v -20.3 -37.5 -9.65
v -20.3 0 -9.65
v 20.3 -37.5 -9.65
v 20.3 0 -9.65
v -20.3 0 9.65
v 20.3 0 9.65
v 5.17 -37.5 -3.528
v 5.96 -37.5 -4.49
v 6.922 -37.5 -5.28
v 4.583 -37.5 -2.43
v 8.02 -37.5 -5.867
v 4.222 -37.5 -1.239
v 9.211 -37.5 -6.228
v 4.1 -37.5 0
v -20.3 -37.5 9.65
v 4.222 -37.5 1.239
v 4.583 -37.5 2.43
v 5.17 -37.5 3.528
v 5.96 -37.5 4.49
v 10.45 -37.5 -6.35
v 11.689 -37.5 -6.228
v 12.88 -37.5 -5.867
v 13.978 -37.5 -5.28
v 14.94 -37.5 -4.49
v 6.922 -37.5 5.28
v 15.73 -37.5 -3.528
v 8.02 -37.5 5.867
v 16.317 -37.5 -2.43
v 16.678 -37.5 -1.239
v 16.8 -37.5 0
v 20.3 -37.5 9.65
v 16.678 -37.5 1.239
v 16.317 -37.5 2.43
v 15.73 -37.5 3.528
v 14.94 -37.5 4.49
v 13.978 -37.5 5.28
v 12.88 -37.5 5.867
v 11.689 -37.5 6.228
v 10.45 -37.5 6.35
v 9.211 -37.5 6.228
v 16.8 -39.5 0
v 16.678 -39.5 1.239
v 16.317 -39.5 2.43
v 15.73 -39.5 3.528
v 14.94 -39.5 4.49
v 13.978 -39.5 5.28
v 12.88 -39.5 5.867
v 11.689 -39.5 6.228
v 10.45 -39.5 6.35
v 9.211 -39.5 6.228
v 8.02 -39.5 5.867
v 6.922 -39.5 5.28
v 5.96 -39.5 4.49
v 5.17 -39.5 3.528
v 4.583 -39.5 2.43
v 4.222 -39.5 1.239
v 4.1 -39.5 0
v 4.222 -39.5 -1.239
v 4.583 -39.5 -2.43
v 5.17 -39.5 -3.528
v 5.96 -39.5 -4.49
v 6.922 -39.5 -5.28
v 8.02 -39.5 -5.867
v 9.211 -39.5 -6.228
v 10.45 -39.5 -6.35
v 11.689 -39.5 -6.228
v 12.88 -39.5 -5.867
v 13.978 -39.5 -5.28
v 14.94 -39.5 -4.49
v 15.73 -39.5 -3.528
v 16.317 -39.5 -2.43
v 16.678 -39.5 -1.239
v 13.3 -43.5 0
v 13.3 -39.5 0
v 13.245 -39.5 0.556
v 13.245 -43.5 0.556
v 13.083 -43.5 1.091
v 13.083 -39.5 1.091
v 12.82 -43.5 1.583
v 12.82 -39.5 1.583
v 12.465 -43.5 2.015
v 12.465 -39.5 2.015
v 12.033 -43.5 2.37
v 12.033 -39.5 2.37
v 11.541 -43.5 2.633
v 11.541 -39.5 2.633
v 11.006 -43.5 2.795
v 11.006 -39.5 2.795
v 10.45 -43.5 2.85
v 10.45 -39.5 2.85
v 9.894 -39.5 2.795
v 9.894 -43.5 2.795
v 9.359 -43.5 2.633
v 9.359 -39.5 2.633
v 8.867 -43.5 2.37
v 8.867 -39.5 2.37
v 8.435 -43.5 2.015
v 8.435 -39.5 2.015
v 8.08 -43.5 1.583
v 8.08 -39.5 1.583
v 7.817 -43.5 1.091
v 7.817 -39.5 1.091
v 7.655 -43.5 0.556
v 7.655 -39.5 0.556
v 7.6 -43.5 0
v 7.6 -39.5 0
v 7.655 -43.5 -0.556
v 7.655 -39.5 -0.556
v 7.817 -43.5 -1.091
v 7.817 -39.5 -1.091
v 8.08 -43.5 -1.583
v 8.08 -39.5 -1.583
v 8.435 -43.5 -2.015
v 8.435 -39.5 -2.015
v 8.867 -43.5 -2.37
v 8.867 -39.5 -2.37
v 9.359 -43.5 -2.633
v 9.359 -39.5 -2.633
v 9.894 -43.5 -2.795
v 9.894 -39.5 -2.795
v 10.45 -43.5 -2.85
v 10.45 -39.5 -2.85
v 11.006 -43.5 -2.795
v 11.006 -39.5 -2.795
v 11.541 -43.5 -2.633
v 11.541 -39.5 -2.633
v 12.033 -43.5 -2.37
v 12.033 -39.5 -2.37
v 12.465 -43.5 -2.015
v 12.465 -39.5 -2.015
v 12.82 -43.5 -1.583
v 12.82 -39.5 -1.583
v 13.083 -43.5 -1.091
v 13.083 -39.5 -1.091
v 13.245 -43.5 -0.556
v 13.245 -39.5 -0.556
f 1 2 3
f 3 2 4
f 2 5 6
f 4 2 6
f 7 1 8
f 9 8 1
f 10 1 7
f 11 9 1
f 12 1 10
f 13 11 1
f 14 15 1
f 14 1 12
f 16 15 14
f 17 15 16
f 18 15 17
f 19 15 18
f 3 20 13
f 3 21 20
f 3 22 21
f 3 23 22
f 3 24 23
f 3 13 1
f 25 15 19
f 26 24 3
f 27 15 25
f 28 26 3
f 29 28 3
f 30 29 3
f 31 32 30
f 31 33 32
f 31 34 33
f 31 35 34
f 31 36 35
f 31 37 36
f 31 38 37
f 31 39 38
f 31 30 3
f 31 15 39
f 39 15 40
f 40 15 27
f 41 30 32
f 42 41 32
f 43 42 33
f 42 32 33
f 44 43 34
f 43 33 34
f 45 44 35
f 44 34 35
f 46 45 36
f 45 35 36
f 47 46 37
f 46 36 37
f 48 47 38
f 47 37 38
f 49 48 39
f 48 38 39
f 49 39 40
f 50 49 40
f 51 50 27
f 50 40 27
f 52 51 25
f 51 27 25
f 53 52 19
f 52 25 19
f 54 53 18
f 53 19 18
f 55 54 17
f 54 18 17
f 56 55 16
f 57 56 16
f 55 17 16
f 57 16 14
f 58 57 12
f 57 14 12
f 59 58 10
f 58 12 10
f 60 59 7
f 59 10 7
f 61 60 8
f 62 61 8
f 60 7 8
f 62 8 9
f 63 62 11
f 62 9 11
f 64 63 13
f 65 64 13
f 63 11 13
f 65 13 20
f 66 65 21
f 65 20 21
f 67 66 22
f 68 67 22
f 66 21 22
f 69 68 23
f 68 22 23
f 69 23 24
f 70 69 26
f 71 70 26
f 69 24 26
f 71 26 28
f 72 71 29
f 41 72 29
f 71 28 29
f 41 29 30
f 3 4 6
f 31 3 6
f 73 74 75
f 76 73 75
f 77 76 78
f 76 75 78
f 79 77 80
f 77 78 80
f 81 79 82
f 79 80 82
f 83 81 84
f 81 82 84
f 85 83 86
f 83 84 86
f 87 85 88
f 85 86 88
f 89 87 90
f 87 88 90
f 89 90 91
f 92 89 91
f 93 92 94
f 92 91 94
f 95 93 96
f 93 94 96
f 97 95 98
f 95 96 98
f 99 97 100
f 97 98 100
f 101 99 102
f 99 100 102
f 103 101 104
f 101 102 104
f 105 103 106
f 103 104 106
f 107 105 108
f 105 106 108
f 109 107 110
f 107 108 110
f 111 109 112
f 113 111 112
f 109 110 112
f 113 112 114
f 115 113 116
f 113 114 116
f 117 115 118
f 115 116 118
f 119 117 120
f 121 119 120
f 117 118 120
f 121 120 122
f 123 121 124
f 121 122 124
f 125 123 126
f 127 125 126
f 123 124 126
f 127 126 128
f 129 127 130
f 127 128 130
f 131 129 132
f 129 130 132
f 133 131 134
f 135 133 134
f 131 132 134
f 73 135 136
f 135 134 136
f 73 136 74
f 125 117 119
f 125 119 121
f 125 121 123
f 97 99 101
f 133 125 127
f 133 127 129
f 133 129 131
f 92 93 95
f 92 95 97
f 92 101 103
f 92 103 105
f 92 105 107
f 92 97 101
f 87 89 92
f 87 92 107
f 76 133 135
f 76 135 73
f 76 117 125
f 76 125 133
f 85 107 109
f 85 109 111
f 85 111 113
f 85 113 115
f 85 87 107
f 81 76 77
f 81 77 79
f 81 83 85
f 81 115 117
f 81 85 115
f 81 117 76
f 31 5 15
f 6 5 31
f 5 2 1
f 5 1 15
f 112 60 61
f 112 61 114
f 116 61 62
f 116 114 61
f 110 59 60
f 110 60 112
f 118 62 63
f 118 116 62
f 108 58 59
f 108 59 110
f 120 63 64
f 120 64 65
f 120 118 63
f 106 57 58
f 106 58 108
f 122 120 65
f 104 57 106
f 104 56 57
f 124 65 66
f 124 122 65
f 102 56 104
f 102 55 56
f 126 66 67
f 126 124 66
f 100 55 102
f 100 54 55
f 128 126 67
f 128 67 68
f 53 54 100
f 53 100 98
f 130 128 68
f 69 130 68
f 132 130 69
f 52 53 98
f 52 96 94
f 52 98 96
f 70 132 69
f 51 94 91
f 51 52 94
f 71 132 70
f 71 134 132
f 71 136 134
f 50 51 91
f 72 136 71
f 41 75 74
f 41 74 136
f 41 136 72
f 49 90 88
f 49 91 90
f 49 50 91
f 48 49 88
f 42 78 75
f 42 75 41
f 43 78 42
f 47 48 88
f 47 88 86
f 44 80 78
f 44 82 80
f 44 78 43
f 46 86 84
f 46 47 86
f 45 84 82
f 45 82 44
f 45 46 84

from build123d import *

# Parameters (mm, degrees)
F0_W     = 40.6
F0_H     = 19.3
F1_DEPTH = 37.5
F2_R     = 6.35
F3_DEPTH = 2
F4_R     = 2.85
F5_DEPTH = 4


with BuildPart() as f1:
    # F0 (on Front) → F1 (new body)
    with BuildSketch(Plane.XZ):
        Rectangle(F0_W, F0_H)
    extrude(amount=F1_DEPTH)

    # F2 (on face) → F3 (join)
    with BuildSketch(Plane.XZ.offset(37.5)):
        with Locations((10.45, 0)):
            Circle(F2_R)
    extrude(amount=F3_DEPTH)

    # F4 (on face) → F5 (join)
    with BuildSketch(Plane.XZ.offset(39.5)):
        with Locations((10.45, 0)):
            Circle(F4_R)
    extrude(amount=F5_DEPTH)


solid = f1.part
